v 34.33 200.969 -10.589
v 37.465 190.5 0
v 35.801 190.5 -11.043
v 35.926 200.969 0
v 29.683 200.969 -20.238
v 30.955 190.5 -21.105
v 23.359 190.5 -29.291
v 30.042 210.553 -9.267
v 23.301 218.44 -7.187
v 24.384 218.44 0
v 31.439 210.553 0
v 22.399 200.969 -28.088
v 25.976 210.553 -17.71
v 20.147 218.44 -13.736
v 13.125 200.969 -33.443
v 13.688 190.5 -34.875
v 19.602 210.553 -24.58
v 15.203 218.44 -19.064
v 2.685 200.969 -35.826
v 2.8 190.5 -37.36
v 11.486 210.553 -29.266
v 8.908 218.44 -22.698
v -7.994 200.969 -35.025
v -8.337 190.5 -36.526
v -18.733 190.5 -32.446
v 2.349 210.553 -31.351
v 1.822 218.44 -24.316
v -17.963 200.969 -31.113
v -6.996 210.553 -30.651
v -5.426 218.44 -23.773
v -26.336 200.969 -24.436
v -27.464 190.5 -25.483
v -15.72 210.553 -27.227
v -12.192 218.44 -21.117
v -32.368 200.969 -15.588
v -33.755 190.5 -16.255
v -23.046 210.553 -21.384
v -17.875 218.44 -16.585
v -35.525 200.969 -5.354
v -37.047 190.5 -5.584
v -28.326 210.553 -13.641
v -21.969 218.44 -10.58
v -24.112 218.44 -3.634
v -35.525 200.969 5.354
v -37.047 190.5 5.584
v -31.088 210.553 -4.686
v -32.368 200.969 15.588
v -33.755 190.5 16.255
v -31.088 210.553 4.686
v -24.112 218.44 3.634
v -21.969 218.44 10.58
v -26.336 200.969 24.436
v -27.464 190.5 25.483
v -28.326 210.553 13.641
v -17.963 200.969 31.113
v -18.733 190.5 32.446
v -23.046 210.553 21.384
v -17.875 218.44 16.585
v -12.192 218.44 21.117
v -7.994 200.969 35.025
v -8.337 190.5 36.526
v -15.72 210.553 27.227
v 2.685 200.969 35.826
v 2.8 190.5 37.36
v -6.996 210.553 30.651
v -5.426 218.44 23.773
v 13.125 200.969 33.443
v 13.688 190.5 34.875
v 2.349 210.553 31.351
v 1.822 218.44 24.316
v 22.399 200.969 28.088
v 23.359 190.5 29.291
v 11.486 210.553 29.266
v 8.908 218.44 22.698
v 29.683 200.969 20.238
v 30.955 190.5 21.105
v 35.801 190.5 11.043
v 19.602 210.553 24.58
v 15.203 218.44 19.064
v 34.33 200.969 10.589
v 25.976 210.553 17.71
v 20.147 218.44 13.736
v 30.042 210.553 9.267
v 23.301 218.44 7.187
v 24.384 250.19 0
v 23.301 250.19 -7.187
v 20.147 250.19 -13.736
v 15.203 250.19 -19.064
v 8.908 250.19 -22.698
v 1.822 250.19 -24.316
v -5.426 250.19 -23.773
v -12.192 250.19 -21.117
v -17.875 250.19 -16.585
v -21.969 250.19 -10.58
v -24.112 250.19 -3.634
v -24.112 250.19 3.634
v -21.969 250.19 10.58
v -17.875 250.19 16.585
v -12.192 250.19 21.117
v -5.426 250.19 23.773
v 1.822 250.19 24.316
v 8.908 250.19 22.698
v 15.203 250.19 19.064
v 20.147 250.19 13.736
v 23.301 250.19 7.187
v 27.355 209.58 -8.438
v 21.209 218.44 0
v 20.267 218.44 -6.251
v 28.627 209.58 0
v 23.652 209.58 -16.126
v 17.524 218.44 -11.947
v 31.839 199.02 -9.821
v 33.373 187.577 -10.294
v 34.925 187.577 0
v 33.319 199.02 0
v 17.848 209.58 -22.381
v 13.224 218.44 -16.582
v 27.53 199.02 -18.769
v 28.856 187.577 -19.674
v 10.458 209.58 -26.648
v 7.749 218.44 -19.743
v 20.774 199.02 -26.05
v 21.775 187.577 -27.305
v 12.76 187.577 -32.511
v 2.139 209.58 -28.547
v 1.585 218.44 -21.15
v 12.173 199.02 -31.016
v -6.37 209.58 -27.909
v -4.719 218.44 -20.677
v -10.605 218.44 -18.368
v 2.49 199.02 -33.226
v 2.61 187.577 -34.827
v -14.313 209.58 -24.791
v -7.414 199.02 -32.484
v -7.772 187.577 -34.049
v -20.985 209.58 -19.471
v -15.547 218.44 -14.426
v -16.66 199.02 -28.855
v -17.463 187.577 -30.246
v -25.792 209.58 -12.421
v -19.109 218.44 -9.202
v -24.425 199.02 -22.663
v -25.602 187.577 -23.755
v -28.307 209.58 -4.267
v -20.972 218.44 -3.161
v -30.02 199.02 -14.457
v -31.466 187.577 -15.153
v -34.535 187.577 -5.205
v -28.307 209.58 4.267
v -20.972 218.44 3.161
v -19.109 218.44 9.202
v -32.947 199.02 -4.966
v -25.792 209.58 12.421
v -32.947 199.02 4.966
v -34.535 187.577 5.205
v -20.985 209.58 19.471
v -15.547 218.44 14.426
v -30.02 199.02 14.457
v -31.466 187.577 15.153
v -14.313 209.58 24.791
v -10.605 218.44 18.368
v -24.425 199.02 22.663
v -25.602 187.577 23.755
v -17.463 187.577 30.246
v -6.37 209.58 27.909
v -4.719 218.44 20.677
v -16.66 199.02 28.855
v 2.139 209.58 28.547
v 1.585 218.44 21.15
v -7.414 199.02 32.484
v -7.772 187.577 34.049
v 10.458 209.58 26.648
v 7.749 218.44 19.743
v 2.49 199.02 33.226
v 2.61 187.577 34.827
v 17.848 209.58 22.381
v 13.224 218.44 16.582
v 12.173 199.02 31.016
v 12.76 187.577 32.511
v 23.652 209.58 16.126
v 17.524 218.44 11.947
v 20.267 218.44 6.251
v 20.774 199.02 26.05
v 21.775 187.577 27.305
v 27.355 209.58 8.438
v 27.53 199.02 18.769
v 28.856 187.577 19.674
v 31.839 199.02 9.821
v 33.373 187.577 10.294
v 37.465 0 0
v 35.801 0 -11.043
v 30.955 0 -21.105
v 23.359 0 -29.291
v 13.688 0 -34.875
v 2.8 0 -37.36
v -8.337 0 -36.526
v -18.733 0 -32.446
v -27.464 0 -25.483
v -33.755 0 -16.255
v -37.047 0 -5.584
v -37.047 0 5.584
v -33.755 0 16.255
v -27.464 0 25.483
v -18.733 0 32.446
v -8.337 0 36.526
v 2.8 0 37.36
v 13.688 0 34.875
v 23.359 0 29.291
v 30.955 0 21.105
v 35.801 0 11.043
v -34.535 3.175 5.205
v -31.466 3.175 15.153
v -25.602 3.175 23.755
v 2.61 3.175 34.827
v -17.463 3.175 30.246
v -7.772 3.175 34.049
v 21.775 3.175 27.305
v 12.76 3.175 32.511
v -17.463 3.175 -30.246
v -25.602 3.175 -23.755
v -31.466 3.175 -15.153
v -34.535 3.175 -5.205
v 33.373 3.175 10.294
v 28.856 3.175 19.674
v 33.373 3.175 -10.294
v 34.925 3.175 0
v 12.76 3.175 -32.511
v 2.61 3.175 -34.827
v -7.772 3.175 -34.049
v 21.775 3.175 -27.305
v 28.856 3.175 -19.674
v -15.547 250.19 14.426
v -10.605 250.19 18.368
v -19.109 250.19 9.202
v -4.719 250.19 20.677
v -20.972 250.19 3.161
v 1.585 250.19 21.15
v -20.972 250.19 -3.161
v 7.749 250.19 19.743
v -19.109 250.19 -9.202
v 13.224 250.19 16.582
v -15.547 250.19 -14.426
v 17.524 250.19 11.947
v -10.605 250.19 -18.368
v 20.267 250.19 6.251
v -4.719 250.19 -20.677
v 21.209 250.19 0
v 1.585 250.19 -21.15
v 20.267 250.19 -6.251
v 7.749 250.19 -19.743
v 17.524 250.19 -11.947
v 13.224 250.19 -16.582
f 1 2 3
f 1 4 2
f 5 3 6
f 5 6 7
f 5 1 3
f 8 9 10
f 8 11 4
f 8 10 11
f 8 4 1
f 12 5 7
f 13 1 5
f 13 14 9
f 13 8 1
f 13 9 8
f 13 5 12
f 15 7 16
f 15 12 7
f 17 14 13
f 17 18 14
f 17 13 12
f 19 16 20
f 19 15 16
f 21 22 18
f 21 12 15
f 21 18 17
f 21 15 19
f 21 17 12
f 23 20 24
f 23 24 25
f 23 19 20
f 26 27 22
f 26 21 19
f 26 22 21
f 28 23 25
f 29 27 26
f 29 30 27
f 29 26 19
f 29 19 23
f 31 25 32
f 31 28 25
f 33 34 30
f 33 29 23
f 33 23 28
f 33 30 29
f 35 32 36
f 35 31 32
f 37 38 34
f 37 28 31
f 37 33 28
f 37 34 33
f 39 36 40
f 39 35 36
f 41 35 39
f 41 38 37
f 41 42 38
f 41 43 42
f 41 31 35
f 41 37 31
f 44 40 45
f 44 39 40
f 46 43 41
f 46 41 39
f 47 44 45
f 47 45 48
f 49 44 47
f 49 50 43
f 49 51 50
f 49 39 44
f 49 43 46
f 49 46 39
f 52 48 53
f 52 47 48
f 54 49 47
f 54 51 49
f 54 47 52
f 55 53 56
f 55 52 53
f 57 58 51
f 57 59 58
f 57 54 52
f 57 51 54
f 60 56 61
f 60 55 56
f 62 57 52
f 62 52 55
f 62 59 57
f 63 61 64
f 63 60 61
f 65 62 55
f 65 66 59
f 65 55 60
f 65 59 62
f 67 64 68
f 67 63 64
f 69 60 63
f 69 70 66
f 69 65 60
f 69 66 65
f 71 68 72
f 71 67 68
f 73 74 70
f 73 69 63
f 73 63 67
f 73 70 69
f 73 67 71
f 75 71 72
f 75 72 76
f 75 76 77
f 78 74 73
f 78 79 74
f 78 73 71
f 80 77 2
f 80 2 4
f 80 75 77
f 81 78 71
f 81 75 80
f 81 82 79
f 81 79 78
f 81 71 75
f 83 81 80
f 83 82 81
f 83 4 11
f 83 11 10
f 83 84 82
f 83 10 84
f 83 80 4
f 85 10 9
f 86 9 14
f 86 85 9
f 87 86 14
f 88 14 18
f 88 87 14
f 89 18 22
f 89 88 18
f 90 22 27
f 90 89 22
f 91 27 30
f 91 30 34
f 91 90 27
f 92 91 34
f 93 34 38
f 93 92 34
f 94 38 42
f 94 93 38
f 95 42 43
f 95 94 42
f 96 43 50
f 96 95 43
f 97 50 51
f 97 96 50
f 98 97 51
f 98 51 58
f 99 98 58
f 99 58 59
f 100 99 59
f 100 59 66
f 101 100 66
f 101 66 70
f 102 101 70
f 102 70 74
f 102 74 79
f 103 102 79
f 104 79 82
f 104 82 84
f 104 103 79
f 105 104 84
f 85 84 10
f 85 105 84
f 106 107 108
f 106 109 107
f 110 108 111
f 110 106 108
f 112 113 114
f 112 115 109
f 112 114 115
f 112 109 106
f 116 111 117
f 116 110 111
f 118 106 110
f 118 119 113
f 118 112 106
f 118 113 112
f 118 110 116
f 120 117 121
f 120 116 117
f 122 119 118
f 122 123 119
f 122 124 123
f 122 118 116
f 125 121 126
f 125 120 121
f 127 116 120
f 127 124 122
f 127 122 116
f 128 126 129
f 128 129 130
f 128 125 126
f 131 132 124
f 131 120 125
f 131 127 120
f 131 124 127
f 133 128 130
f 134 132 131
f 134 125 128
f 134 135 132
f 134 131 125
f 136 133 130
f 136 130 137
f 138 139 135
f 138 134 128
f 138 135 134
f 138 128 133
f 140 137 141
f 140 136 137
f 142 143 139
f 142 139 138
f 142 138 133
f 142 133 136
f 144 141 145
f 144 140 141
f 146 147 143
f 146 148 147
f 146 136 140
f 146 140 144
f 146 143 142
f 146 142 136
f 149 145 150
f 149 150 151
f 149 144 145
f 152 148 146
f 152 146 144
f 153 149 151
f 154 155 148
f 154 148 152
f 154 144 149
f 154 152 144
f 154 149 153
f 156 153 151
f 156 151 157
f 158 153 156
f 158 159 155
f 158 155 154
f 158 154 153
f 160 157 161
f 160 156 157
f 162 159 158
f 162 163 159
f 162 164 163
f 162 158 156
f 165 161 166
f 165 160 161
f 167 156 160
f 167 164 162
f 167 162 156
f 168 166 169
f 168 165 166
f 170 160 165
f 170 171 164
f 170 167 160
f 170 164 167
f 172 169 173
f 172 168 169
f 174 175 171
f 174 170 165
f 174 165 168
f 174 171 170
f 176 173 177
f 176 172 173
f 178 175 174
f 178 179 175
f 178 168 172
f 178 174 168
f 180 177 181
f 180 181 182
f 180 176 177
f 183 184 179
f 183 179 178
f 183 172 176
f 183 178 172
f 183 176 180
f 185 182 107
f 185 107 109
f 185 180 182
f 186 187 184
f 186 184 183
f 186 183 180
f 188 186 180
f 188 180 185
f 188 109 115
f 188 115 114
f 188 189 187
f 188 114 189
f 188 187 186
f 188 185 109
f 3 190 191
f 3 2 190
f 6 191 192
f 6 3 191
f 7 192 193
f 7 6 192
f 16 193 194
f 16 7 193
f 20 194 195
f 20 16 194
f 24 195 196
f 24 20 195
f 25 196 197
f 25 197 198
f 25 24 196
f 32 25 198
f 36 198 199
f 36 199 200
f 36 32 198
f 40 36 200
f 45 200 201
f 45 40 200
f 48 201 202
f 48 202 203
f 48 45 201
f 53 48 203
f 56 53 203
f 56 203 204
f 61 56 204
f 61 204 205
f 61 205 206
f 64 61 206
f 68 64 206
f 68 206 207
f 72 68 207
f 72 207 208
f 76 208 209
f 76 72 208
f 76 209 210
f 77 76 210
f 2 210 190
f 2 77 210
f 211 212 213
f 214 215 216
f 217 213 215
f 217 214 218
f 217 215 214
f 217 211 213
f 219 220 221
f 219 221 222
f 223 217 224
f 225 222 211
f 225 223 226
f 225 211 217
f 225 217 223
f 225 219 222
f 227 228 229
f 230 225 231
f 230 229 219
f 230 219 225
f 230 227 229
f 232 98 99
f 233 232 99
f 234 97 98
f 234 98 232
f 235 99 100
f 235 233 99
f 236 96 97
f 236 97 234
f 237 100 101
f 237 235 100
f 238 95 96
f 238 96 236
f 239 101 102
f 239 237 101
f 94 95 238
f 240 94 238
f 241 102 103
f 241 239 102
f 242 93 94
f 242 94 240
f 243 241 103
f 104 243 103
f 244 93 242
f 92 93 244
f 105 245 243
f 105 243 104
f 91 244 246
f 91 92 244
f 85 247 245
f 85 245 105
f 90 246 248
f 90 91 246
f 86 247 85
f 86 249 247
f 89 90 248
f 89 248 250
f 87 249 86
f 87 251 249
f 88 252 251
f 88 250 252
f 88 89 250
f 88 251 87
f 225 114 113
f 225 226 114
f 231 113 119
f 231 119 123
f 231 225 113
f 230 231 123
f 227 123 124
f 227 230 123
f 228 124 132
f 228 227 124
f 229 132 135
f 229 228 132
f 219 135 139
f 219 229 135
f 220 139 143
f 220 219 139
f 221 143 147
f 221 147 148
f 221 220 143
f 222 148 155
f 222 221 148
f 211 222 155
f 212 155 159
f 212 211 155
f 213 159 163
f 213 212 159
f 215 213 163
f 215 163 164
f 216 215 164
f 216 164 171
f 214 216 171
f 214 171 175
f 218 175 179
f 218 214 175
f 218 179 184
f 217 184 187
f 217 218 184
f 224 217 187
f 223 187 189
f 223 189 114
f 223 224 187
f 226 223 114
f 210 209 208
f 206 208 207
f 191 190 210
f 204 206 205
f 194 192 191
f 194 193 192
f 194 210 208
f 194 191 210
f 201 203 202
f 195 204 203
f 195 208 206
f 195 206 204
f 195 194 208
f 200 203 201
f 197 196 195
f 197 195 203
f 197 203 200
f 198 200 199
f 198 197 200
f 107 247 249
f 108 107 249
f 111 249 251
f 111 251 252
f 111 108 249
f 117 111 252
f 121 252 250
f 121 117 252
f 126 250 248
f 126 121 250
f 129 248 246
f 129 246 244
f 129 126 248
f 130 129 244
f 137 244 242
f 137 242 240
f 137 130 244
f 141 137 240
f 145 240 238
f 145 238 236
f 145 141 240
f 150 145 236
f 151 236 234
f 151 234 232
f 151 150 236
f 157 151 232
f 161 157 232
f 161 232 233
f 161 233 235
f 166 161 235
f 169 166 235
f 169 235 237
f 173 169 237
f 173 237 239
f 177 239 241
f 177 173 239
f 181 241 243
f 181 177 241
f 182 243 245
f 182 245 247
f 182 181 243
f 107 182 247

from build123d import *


with BuildPart() as part:
    # Sketch3 → Revolve1 (revolve)
    with BuildSketch(Plane.XY):
        with BuildLine():
            Line((0, 0), (37.465, 0))
            Line((37.465, 0), (37.465, 190.5))
            ThreePointArc((37.465, 190.5), (34.032849621, 205.925272777), (24.384, 218.44))
            Line((24.384, 218.44), (24.384, 250.19))
            Line((24.384, 250.19), (21.209, 250.19))
            Line((21.209, 250.19), (21.209, 218.44))
            ThreePointArc((21.209, 218.44), (31.341590564, 204.463946967), (34.925, 187.577306486))
            Line((34.925, 187.577306486), (34.925, 3.175))
            Line((34.925, 3.175), (0, 3.175))
            Line((0, 3.175), (0, 0))
        make_face()
    revolve(axis=Axis((0, 0, 0), (0, 1, 0)))


solid = part.part
